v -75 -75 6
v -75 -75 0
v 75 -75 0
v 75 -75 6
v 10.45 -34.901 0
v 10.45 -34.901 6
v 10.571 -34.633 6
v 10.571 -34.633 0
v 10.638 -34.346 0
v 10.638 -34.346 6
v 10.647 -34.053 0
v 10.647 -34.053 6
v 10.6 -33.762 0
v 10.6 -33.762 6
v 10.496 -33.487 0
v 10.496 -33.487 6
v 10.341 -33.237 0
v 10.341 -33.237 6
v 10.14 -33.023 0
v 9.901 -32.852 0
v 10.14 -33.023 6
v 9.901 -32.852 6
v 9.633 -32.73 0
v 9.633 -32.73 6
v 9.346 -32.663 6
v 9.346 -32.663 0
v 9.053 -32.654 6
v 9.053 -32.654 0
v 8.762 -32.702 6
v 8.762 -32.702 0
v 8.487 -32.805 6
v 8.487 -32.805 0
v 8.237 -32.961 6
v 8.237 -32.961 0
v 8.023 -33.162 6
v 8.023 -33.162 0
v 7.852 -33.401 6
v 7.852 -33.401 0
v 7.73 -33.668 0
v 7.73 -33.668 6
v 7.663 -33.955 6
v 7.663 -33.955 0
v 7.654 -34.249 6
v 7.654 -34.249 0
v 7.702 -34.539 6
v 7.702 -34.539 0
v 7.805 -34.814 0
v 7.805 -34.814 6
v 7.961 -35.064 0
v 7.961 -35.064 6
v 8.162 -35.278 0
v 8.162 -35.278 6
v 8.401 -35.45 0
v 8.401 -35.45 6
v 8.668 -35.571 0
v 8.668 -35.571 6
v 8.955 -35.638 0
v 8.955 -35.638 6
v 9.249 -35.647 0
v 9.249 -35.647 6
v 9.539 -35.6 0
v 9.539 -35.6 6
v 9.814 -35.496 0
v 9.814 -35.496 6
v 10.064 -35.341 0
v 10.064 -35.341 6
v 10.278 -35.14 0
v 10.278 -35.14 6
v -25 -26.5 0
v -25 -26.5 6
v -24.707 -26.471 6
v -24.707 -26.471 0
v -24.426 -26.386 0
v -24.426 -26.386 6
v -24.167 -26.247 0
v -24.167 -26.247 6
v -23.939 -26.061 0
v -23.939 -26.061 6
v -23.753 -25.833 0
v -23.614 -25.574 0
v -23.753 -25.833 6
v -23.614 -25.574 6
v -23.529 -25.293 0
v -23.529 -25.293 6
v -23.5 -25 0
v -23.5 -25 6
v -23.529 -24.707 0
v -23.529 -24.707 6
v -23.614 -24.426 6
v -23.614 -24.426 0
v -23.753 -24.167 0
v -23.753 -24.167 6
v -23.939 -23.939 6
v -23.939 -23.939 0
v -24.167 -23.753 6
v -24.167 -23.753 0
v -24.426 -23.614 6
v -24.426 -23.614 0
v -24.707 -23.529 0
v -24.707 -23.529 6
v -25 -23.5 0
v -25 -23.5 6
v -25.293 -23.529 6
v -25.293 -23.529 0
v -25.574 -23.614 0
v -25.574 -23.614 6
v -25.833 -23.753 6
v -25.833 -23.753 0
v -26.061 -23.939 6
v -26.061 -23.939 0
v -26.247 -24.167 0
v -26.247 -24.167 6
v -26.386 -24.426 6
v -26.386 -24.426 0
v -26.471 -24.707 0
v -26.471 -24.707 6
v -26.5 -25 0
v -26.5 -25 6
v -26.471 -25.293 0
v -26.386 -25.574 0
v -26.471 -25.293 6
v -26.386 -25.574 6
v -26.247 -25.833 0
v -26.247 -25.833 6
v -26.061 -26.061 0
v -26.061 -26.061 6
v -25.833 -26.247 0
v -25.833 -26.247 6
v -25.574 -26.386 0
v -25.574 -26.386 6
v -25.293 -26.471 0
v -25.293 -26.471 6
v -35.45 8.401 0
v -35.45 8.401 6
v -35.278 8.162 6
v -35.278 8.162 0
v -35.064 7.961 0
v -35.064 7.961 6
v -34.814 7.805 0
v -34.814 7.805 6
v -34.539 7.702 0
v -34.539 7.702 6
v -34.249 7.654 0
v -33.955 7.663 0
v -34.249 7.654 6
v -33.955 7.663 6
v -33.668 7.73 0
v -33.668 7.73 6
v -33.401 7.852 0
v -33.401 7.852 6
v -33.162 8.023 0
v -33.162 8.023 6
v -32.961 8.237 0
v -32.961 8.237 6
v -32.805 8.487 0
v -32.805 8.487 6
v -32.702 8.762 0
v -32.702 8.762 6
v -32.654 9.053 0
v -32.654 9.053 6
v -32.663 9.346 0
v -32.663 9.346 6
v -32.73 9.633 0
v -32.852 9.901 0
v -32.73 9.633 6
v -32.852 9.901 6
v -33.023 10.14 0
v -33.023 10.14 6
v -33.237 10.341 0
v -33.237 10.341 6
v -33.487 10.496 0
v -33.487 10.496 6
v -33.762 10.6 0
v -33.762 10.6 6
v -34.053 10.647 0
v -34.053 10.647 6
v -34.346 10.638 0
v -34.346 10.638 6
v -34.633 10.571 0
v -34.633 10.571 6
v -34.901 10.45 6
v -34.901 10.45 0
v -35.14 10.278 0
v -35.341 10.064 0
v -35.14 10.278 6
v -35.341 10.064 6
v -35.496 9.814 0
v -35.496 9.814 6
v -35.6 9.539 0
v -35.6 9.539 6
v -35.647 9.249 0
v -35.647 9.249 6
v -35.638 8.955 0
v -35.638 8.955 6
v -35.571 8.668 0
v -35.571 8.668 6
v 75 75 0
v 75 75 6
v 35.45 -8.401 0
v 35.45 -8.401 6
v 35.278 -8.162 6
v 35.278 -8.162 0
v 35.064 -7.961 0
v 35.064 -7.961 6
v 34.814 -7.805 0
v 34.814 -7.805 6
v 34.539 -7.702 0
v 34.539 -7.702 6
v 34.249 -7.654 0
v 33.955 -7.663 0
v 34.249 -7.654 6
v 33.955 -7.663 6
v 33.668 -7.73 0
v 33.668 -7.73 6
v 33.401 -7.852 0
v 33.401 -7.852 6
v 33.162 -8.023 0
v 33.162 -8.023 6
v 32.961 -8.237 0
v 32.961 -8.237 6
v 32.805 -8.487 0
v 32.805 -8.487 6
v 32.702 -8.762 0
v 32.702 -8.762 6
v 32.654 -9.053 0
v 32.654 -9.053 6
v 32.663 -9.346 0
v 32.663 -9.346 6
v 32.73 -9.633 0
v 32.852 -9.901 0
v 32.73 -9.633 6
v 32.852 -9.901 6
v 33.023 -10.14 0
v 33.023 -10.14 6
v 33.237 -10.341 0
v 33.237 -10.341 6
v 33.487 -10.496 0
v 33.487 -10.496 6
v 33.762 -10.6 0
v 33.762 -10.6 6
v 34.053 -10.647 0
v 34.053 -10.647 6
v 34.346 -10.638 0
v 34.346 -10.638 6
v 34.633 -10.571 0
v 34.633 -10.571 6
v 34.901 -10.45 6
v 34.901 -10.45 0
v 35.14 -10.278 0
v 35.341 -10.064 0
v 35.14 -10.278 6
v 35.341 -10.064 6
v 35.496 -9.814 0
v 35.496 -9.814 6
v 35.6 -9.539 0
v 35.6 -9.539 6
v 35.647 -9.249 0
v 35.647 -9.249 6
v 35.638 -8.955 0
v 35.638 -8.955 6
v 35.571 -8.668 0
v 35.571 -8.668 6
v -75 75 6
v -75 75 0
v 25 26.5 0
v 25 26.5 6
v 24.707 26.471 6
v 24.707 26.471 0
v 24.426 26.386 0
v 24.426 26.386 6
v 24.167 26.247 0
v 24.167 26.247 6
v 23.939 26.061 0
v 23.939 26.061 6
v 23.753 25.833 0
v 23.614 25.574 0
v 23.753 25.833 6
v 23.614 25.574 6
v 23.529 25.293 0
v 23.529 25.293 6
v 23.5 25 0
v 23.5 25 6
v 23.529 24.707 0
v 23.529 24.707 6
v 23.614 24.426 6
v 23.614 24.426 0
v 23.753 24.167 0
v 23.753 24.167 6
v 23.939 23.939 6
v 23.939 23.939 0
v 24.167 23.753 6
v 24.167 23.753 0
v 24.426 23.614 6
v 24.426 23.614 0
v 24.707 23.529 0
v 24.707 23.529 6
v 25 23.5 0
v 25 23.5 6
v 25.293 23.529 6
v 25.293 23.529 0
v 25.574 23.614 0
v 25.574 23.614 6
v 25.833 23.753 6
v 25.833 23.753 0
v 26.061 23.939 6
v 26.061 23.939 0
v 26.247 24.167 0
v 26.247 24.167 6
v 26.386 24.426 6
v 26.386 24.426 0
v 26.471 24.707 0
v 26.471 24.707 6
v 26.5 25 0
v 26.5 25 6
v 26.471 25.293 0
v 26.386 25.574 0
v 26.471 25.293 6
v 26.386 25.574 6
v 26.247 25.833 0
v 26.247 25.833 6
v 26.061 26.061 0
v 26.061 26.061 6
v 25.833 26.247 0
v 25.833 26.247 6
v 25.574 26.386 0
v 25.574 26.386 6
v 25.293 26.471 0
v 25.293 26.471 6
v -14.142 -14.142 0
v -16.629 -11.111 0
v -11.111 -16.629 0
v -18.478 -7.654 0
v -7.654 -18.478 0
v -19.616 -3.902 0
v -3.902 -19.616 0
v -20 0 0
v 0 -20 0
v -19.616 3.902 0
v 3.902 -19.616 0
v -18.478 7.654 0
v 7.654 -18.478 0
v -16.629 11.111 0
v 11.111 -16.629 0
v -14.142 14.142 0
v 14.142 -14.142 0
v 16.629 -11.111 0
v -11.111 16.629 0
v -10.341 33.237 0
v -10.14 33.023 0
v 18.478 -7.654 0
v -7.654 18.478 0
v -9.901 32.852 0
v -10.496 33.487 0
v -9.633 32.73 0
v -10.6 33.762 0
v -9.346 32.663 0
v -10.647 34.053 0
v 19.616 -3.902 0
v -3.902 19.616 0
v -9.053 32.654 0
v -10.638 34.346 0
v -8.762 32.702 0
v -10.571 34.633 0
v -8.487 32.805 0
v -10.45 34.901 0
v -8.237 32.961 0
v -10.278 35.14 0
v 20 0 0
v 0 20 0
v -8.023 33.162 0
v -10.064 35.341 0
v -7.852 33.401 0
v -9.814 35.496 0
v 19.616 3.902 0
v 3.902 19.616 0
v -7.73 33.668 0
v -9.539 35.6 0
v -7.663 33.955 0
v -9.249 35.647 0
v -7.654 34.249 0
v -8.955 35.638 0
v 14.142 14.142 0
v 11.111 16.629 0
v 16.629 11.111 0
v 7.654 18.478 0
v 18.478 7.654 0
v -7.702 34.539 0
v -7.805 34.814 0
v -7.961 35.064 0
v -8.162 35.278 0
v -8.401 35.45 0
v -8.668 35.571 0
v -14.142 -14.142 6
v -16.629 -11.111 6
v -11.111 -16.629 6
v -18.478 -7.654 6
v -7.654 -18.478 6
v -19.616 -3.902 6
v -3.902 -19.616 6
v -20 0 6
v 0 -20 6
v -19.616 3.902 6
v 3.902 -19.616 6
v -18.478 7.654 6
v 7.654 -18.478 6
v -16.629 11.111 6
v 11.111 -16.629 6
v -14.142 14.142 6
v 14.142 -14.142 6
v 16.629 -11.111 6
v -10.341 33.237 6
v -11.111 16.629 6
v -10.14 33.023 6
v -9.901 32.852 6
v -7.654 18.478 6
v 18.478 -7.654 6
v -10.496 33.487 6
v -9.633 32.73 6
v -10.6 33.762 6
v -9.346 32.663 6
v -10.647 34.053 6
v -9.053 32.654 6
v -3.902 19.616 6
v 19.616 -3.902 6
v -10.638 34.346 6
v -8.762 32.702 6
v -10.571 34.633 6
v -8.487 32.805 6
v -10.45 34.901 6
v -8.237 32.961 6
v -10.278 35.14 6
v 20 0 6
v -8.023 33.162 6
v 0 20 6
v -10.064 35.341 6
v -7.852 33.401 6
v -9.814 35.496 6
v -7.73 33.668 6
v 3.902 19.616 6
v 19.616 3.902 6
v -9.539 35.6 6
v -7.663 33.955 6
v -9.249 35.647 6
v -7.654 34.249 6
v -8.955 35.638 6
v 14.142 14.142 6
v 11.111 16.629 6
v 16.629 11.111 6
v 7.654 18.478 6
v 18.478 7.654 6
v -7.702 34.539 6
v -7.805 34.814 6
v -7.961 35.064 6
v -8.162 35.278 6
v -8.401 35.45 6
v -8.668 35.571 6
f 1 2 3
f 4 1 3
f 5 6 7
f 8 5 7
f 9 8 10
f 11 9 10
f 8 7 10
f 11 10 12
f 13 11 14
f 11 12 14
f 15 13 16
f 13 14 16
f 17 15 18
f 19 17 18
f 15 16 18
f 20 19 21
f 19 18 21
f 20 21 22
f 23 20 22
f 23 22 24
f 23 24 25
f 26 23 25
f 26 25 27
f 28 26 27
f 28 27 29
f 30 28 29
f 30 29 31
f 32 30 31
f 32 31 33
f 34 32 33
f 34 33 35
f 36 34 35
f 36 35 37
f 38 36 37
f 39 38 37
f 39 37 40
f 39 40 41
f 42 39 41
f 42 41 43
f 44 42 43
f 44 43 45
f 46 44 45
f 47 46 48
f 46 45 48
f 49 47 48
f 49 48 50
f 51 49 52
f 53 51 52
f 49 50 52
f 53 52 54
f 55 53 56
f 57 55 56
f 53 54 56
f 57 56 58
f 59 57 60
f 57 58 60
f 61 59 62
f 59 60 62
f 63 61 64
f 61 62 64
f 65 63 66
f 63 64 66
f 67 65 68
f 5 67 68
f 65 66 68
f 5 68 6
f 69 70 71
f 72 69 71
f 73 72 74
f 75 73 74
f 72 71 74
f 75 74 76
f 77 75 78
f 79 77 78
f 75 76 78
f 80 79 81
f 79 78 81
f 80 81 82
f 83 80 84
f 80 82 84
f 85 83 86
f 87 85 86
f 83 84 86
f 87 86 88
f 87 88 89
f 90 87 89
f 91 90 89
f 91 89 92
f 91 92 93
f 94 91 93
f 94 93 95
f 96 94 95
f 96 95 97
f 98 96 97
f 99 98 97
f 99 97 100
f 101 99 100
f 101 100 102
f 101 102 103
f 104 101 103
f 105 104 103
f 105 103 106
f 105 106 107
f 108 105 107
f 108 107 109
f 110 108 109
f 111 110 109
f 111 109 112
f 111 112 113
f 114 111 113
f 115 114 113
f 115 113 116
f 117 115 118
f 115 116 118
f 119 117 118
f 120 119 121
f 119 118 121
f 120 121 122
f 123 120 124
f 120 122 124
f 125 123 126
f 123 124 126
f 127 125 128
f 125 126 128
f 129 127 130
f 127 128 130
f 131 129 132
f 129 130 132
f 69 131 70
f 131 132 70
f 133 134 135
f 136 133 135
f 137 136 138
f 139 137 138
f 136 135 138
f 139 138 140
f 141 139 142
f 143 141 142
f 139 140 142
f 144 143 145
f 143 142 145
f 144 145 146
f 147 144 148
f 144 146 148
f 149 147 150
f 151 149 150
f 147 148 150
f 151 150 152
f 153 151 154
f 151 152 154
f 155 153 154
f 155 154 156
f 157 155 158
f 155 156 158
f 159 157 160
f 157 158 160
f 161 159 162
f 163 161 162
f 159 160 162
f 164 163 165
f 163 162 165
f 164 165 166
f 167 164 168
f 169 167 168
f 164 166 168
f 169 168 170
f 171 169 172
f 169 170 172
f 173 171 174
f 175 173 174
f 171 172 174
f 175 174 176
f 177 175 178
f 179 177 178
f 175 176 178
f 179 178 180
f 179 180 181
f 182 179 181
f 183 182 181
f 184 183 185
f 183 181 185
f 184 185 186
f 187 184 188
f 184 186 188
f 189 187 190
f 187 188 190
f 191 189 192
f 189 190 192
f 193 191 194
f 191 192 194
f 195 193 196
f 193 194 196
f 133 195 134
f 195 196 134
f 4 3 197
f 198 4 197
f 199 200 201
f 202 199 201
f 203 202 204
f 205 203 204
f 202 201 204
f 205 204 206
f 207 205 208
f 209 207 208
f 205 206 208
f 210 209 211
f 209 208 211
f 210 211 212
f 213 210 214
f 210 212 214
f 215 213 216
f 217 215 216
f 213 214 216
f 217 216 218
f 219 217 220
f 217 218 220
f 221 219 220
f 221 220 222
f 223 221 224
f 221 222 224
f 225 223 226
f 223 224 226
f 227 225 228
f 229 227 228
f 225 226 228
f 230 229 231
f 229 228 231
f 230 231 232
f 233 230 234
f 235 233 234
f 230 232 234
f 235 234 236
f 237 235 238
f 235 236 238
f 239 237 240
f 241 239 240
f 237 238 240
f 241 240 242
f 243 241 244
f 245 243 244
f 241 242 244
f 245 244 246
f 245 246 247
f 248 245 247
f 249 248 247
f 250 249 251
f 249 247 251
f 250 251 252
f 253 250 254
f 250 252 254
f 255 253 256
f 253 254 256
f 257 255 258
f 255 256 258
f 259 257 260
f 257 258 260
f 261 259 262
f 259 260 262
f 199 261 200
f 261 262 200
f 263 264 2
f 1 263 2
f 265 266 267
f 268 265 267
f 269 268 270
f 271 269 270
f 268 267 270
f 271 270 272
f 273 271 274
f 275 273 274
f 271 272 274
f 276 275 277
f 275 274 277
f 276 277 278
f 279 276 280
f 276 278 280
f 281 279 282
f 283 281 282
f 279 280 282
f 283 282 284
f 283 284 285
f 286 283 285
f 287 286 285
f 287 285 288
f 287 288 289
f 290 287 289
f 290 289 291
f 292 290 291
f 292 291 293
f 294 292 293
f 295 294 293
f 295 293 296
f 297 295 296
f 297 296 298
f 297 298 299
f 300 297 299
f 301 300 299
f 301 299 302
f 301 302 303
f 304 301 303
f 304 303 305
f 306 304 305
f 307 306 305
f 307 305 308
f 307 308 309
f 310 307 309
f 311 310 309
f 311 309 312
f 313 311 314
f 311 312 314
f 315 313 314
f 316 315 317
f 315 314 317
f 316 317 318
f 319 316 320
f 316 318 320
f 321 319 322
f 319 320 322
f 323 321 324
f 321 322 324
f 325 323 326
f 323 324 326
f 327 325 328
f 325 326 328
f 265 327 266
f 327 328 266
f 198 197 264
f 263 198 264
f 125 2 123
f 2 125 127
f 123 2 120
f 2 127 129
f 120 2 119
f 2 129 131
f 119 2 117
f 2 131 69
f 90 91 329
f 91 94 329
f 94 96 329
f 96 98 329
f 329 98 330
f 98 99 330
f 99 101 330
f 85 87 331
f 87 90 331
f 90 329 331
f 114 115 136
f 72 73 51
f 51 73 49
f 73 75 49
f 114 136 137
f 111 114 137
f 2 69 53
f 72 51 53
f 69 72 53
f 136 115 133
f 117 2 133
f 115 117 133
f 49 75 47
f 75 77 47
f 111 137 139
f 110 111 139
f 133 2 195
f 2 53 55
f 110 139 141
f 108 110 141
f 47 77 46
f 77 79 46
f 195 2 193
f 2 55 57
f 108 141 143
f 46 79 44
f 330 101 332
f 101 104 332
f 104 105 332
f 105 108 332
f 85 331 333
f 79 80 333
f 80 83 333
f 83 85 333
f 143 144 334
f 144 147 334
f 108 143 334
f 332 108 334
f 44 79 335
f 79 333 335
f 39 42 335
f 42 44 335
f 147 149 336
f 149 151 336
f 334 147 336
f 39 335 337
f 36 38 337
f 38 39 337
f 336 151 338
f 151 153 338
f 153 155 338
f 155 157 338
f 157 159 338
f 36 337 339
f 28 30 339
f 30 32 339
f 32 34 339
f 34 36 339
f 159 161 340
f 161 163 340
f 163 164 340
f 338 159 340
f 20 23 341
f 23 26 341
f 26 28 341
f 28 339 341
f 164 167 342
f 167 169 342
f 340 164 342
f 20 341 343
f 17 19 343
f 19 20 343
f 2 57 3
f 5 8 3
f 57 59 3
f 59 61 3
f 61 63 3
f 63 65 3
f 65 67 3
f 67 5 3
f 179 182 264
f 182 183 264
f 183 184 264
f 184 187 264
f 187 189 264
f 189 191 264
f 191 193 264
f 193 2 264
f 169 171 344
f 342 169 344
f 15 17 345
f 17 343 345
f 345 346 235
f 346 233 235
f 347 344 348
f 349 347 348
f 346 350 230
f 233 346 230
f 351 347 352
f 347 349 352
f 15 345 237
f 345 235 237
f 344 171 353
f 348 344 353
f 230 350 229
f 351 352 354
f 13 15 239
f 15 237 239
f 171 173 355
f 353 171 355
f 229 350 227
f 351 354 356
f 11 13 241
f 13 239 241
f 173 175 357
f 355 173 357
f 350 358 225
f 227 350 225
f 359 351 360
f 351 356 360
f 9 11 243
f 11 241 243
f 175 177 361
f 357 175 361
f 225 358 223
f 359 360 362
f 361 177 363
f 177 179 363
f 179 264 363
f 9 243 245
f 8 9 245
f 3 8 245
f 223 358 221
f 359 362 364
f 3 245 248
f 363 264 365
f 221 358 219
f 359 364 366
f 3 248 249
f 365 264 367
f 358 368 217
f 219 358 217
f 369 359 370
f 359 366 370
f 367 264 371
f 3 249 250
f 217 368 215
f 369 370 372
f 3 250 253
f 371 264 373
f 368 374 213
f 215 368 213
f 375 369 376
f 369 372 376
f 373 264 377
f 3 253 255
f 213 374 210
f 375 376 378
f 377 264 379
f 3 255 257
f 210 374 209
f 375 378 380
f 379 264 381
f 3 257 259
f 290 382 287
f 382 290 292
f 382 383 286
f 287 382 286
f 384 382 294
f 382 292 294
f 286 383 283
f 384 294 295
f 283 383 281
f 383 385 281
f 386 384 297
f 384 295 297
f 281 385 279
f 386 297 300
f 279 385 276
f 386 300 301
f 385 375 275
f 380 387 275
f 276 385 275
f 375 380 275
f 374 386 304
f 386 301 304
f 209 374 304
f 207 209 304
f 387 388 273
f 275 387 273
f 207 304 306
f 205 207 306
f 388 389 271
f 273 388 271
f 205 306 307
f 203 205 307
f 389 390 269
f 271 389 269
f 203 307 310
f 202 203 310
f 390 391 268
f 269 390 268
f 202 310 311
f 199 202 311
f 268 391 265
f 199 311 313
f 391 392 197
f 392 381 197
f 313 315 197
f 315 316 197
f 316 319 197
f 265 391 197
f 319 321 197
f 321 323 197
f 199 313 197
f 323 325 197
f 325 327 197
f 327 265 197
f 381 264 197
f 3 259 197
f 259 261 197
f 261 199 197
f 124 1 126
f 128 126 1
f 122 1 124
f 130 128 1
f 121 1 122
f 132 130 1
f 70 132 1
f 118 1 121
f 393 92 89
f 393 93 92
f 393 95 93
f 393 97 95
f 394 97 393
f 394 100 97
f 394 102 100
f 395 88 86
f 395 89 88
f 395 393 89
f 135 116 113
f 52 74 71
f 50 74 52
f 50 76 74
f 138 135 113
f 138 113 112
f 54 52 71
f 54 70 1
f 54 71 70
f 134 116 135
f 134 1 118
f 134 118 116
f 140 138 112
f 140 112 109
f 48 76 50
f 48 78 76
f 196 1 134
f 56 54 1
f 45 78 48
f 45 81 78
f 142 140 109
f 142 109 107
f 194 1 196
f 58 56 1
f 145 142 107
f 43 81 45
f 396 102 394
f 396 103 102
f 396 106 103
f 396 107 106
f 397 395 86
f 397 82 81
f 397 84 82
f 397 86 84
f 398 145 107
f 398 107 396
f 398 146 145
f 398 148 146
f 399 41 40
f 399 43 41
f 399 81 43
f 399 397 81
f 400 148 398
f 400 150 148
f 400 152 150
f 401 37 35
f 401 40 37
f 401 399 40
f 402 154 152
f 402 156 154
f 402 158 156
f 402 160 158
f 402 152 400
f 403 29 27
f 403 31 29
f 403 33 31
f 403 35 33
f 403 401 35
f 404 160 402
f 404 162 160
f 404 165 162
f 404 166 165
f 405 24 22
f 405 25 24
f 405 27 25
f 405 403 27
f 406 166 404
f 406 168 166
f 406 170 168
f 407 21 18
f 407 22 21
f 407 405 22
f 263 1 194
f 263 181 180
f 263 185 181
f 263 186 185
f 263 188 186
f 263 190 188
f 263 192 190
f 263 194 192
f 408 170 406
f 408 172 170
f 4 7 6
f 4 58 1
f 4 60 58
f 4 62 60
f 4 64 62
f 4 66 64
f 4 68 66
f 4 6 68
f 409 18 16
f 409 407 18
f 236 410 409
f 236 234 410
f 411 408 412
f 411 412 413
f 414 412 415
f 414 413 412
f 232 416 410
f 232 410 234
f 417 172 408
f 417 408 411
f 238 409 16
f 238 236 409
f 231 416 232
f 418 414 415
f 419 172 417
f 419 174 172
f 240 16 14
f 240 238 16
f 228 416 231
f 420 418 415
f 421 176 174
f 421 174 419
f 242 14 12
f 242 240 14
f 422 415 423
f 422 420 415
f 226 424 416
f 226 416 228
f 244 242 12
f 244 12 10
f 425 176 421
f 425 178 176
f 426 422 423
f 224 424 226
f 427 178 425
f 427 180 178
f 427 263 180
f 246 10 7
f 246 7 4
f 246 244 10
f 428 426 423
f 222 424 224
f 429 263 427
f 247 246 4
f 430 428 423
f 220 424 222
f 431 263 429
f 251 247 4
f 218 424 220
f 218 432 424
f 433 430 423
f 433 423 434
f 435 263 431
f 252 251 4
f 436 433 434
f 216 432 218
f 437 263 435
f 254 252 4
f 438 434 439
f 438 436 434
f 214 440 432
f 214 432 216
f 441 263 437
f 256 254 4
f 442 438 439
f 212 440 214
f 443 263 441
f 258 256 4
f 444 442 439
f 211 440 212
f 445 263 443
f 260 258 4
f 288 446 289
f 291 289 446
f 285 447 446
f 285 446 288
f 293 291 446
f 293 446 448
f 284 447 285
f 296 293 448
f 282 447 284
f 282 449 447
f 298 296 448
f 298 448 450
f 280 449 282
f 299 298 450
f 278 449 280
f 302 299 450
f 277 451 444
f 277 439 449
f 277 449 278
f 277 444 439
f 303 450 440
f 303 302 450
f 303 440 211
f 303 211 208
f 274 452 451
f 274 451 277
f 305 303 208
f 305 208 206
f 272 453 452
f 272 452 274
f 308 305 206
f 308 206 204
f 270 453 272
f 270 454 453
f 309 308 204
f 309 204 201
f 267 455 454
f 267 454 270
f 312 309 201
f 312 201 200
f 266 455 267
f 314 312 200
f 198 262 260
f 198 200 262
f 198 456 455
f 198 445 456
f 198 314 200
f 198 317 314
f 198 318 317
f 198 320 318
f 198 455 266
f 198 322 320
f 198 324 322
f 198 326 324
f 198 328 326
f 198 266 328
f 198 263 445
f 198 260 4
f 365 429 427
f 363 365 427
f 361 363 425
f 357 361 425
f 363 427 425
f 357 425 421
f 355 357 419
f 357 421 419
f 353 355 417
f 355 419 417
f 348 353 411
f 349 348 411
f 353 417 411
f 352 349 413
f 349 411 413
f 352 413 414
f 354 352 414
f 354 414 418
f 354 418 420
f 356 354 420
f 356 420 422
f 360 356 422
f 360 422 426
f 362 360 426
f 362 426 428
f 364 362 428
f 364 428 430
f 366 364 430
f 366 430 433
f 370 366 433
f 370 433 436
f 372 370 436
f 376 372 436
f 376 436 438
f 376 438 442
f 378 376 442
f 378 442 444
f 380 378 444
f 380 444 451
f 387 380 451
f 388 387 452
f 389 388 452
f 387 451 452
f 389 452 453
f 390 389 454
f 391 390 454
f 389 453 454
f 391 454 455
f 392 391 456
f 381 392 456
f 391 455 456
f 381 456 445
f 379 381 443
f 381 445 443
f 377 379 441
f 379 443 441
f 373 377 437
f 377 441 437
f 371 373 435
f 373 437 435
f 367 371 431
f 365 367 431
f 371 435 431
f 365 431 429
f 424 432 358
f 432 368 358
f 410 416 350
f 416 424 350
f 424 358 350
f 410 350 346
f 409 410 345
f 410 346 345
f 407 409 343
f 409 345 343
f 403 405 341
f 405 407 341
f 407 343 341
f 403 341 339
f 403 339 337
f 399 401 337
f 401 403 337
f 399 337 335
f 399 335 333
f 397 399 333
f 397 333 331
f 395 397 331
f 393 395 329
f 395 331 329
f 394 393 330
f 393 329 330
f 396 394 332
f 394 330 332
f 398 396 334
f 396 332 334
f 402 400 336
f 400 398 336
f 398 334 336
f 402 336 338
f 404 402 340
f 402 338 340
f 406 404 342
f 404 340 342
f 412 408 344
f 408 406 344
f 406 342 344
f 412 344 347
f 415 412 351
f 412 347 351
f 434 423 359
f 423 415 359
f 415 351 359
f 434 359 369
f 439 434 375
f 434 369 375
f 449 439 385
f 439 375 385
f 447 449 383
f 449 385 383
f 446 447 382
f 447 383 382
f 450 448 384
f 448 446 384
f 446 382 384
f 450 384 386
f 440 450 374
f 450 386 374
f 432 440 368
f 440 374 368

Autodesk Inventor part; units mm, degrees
ref_plane "YZ Plane" through (0, 0, 0) normal (1, 0, 0) x (0, 1, 0)
ref_plane "XZ Plane" through (0, 0, 0) normal (0, 1, 0) x (-1, 0, 0)
ref_plane "XY Plane" through (0, 0, 0) normal (0, 0, 1) x (1, 0, 0)
sketch "Sketch1" plane through (0, 0, 0) normal (0, 0, 1) x (1, 0, 0)
  line L0 (-75, -75) -> (75, -75)
  line L1 (75, -75) -> (75, 75)
  line L2 (75, 75) -> (-75, 75)
  line L3 (-75, 75) -> (-75, -75)
  line L4 (-75, -75) -> (75, 75) construction
  line L5 (75, -75) -> (-75, 75) construction
  circle A0 centre (0, 0) radius 20
  point P0 (25, 25)
  dimension "d0" = 150
  dimension "d1" = 150
  dimension "d2" = 40
  dimension "d5" = 25
extrude "Extrusion1" add sketch "Sketch1" along normal blind 6
hole "Hole1" at (25, 25, 0) direction (0, 0, 1) diameter 3 end through all
pattern_circular "Circular Pattern1" count 6 over 360 about axis through (0, 0, 0) along (0, 0, 1) of "Hole1"
properties part number "base_plate" material "Plywood, Finish"
